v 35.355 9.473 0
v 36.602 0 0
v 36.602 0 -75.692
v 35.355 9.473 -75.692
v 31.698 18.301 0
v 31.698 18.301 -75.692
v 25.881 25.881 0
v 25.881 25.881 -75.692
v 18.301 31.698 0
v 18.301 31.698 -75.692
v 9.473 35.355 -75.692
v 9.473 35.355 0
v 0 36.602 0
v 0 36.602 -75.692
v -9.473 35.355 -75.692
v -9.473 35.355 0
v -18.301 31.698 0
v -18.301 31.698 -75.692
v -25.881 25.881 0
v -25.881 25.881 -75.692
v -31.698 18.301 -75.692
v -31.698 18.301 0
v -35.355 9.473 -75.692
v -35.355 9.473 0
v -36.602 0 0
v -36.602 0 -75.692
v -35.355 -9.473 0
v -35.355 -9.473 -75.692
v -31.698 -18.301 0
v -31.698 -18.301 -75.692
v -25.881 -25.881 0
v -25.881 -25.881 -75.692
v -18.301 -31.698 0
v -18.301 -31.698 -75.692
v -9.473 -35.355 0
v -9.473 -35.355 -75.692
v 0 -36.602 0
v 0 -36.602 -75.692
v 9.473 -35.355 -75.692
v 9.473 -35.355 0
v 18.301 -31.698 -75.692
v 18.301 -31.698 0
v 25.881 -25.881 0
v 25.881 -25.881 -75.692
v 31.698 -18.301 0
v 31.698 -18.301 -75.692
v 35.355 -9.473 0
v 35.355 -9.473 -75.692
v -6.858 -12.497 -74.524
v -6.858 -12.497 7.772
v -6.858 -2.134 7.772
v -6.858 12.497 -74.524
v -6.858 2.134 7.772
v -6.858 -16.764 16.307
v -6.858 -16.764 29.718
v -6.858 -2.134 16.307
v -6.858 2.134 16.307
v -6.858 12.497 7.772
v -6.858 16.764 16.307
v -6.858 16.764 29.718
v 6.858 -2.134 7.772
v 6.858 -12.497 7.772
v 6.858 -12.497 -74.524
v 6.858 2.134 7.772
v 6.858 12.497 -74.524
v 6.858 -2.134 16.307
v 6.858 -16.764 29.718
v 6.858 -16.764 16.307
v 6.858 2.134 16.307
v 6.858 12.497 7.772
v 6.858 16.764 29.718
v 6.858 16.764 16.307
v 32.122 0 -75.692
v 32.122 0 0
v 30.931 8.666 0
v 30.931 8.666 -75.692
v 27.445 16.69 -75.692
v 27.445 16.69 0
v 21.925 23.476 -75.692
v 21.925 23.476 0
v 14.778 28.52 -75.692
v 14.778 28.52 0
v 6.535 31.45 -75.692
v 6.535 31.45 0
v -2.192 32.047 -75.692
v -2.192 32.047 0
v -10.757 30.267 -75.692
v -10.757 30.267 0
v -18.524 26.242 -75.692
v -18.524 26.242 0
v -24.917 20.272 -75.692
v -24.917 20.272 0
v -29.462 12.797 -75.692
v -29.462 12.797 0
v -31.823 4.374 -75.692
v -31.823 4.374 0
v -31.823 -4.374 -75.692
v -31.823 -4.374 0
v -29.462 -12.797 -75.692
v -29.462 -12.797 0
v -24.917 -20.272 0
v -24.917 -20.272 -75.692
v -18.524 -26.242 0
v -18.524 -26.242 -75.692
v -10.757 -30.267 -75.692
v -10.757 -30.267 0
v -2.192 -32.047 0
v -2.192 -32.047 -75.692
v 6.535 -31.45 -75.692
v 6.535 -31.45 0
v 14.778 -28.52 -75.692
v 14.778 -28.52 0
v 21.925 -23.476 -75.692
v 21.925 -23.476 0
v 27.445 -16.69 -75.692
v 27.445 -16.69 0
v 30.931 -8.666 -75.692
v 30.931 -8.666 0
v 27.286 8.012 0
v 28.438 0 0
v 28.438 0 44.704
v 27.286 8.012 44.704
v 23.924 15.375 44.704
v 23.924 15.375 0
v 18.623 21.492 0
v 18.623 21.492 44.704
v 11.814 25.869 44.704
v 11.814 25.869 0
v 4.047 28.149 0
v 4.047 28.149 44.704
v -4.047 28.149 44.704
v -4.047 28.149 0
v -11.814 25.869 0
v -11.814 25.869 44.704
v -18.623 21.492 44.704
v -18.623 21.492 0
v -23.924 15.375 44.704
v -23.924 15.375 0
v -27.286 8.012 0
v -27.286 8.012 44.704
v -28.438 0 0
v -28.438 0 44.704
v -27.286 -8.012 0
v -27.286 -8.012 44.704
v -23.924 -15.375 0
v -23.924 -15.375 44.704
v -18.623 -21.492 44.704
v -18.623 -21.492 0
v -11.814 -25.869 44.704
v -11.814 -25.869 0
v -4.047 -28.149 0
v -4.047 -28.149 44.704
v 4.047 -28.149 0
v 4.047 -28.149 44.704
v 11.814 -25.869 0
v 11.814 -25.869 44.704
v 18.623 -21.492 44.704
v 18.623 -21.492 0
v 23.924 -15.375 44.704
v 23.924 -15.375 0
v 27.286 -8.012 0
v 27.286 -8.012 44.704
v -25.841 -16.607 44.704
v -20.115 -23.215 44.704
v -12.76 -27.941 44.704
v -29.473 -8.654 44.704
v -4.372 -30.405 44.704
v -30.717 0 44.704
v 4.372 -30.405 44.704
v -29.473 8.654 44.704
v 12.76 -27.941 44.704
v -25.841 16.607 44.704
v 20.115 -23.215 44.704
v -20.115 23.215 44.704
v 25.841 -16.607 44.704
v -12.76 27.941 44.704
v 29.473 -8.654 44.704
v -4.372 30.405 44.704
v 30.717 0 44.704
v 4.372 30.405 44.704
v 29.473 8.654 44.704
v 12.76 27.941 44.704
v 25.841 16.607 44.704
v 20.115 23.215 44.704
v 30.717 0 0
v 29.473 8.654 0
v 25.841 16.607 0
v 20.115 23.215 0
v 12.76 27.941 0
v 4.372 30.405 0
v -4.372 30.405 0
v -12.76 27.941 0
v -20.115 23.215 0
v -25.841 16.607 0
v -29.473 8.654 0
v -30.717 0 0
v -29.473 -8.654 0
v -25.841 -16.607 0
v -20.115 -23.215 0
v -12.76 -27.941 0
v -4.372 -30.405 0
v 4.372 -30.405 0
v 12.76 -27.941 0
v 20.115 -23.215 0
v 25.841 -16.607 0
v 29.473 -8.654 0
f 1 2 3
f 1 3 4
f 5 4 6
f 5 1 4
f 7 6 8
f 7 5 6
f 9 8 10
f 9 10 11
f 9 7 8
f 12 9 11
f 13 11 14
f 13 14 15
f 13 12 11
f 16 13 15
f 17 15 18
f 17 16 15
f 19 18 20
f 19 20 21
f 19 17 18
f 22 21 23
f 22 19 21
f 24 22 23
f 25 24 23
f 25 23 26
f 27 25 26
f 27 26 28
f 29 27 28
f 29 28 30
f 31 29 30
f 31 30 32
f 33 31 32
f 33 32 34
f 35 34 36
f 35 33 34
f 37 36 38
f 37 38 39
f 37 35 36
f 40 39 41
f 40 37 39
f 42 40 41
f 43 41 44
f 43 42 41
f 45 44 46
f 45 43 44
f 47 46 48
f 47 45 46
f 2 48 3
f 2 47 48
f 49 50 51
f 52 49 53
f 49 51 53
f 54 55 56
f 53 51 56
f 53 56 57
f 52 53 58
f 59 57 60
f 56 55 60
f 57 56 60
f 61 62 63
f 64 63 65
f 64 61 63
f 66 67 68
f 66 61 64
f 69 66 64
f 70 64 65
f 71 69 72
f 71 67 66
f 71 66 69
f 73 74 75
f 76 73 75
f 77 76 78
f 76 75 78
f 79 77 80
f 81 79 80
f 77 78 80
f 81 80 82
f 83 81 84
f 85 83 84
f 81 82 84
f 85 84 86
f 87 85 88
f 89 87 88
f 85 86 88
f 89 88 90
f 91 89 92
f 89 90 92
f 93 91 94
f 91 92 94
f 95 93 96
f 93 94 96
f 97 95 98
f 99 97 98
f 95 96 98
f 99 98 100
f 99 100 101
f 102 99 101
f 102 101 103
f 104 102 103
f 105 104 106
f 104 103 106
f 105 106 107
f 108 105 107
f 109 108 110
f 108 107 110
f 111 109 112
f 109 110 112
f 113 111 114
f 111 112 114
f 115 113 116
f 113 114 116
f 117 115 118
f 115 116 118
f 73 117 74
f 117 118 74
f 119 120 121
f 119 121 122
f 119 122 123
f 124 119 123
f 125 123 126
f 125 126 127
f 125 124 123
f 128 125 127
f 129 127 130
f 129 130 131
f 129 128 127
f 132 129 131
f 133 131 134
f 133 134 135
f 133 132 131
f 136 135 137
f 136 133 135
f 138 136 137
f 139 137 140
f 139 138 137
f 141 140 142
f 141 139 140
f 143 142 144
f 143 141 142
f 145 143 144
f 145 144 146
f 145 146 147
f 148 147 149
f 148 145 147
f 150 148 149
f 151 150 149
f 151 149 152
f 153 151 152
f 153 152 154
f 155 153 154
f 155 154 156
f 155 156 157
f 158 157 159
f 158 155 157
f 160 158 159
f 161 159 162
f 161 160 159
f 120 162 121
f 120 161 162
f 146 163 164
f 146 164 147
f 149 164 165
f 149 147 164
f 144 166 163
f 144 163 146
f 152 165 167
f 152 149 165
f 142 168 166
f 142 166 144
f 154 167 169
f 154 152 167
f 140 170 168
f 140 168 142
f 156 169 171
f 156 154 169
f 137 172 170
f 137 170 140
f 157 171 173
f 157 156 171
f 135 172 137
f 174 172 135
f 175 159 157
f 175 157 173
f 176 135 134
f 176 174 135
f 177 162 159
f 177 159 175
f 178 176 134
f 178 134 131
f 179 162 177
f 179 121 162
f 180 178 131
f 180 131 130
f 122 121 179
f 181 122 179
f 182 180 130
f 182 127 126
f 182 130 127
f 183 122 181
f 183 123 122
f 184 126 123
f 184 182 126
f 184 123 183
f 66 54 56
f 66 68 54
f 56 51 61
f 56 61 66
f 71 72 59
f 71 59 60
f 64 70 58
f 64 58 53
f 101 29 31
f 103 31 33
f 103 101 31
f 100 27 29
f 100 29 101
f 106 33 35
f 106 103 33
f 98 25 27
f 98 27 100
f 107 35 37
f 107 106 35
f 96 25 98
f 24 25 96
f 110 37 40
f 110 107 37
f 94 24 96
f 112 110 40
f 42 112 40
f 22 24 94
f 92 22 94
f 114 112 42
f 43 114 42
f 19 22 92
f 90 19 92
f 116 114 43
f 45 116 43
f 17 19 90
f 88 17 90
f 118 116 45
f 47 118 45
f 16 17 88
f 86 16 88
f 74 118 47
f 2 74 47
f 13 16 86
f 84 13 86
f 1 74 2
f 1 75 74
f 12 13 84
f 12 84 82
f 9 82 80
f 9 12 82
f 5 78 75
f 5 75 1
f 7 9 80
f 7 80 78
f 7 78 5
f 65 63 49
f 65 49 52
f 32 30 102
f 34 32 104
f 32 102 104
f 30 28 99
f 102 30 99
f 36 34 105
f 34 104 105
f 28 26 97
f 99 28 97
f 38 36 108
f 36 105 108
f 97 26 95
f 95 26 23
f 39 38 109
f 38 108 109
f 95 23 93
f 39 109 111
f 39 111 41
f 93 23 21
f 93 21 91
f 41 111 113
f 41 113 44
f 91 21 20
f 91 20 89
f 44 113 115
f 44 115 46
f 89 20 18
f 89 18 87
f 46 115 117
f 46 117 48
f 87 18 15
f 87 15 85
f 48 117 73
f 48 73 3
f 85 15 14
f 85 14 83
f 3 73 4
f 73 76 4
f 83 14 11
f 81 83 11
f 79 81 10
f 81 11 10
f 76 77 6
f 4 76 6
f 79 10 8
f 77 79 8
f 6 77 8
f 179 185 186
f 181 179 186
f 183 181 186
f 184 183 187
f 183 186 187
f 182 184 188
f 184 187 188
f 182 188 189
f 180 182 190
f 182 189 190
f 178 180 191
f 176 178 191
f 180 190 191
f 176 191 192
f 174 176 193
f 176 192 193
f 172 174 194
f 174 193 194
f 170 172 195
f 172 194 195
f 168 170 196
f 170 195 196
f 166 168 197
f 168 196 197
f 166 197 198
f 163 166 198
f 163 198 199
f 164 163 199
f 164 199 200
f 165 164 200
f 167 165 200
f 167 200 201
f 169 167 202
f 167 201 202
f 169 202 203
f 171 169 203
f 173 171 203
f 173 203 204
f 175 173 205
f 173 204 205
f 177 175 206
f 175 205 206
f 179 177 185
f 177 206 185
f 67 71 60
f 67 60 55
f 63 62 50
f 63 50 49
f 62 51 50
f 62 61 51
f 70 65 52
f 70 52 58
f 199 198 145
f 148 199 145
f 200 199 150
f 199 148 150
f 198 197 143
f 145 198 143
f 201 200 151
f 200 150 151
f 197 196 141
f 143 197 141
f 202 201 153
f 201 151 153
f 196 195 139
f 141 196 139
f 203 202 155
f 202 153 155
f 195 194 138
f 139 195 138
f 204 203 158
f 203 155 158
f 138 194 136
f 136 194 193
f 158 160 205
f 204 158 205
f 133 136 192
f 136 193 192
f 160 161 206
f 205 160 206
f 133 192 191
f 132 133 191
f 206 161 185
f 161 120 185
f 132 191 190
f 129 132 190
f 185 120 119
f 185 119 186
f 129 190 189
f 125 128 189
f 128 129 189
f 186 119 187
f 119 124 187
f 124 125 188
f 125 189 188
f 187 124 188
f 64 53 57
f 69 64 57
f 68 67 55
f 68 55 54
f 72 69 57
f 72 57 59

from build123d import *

# Parameters (mm, degrees)
F0_R     = 36.6017066127
F0_R_2   = 32.1217103556
F1_DEPTH = 75.692
F2_R     = 30.717200423
F2_R_2   = 28.4384268771
F3_DEPTH = 44.704
F4_W     = 4.2672031559
F4_H     = 8.5344002582
F5_DEPTH = 6.858


with BuildPart() as f1:
    # F0 (on Top) → F1 (new body)
    with BuildSketch(Plane.XY):
        Circle(F0_R)
        Circle(F0_R_2, mode=Mode.SUBTRACT)
    extrude(amount=-F1_DEPTH)


with BuildPart() as f3:
    # F2 (on Top) → F3 (new body)
    with BuildSketch(Plane.XY):
        Circle(F2_R)
        Circle(F2_R_2, mode=Mode.SUBTRACT)
    extrude(amount=F3_DEPTH)


with BuildPart() as f5:
    # F4 (on Right) → F5 (new body)
    with BuildSketch(Plane.YZ):
        Polygon((-2.133601578, 7.7724005096), (-12.4967992306, 7.7724005096), (-12.4967992306, -74.5236049406), (12.4967992306, -74.5236049406), (12.4967992306, 7.7724005096), (2.133601578, 7.7724005096), (2.133601578, -0.7619997486), (-2.133601578, -0.7619997486), align=None)
        with Locations((0, 12.0396006387)):
            Rectangle(F4_W, F4_H)
        with Locations((0, 3.5052003805)):
            Rectangle(F4_W, F4_H)
        Polygon((-16.7640019208, 16.3068007678), (-2.133601578, 16.3068007678), (2.133601578, 16.3068007678), (16.7640019208, 16.3068007678), (16.7640019208, 29.7180023044), (-16.7640019208, 29.7180023044), align=None)
    extrude(amount=F5_DEPTH)

    # F6: F5 across plane


with BuildPart() as f5_1:
    add(f5.part)
    add(f5.part.mirror(Plane.YZ))


solid = Compound([f1.part, f3.part, f5_1.part])
